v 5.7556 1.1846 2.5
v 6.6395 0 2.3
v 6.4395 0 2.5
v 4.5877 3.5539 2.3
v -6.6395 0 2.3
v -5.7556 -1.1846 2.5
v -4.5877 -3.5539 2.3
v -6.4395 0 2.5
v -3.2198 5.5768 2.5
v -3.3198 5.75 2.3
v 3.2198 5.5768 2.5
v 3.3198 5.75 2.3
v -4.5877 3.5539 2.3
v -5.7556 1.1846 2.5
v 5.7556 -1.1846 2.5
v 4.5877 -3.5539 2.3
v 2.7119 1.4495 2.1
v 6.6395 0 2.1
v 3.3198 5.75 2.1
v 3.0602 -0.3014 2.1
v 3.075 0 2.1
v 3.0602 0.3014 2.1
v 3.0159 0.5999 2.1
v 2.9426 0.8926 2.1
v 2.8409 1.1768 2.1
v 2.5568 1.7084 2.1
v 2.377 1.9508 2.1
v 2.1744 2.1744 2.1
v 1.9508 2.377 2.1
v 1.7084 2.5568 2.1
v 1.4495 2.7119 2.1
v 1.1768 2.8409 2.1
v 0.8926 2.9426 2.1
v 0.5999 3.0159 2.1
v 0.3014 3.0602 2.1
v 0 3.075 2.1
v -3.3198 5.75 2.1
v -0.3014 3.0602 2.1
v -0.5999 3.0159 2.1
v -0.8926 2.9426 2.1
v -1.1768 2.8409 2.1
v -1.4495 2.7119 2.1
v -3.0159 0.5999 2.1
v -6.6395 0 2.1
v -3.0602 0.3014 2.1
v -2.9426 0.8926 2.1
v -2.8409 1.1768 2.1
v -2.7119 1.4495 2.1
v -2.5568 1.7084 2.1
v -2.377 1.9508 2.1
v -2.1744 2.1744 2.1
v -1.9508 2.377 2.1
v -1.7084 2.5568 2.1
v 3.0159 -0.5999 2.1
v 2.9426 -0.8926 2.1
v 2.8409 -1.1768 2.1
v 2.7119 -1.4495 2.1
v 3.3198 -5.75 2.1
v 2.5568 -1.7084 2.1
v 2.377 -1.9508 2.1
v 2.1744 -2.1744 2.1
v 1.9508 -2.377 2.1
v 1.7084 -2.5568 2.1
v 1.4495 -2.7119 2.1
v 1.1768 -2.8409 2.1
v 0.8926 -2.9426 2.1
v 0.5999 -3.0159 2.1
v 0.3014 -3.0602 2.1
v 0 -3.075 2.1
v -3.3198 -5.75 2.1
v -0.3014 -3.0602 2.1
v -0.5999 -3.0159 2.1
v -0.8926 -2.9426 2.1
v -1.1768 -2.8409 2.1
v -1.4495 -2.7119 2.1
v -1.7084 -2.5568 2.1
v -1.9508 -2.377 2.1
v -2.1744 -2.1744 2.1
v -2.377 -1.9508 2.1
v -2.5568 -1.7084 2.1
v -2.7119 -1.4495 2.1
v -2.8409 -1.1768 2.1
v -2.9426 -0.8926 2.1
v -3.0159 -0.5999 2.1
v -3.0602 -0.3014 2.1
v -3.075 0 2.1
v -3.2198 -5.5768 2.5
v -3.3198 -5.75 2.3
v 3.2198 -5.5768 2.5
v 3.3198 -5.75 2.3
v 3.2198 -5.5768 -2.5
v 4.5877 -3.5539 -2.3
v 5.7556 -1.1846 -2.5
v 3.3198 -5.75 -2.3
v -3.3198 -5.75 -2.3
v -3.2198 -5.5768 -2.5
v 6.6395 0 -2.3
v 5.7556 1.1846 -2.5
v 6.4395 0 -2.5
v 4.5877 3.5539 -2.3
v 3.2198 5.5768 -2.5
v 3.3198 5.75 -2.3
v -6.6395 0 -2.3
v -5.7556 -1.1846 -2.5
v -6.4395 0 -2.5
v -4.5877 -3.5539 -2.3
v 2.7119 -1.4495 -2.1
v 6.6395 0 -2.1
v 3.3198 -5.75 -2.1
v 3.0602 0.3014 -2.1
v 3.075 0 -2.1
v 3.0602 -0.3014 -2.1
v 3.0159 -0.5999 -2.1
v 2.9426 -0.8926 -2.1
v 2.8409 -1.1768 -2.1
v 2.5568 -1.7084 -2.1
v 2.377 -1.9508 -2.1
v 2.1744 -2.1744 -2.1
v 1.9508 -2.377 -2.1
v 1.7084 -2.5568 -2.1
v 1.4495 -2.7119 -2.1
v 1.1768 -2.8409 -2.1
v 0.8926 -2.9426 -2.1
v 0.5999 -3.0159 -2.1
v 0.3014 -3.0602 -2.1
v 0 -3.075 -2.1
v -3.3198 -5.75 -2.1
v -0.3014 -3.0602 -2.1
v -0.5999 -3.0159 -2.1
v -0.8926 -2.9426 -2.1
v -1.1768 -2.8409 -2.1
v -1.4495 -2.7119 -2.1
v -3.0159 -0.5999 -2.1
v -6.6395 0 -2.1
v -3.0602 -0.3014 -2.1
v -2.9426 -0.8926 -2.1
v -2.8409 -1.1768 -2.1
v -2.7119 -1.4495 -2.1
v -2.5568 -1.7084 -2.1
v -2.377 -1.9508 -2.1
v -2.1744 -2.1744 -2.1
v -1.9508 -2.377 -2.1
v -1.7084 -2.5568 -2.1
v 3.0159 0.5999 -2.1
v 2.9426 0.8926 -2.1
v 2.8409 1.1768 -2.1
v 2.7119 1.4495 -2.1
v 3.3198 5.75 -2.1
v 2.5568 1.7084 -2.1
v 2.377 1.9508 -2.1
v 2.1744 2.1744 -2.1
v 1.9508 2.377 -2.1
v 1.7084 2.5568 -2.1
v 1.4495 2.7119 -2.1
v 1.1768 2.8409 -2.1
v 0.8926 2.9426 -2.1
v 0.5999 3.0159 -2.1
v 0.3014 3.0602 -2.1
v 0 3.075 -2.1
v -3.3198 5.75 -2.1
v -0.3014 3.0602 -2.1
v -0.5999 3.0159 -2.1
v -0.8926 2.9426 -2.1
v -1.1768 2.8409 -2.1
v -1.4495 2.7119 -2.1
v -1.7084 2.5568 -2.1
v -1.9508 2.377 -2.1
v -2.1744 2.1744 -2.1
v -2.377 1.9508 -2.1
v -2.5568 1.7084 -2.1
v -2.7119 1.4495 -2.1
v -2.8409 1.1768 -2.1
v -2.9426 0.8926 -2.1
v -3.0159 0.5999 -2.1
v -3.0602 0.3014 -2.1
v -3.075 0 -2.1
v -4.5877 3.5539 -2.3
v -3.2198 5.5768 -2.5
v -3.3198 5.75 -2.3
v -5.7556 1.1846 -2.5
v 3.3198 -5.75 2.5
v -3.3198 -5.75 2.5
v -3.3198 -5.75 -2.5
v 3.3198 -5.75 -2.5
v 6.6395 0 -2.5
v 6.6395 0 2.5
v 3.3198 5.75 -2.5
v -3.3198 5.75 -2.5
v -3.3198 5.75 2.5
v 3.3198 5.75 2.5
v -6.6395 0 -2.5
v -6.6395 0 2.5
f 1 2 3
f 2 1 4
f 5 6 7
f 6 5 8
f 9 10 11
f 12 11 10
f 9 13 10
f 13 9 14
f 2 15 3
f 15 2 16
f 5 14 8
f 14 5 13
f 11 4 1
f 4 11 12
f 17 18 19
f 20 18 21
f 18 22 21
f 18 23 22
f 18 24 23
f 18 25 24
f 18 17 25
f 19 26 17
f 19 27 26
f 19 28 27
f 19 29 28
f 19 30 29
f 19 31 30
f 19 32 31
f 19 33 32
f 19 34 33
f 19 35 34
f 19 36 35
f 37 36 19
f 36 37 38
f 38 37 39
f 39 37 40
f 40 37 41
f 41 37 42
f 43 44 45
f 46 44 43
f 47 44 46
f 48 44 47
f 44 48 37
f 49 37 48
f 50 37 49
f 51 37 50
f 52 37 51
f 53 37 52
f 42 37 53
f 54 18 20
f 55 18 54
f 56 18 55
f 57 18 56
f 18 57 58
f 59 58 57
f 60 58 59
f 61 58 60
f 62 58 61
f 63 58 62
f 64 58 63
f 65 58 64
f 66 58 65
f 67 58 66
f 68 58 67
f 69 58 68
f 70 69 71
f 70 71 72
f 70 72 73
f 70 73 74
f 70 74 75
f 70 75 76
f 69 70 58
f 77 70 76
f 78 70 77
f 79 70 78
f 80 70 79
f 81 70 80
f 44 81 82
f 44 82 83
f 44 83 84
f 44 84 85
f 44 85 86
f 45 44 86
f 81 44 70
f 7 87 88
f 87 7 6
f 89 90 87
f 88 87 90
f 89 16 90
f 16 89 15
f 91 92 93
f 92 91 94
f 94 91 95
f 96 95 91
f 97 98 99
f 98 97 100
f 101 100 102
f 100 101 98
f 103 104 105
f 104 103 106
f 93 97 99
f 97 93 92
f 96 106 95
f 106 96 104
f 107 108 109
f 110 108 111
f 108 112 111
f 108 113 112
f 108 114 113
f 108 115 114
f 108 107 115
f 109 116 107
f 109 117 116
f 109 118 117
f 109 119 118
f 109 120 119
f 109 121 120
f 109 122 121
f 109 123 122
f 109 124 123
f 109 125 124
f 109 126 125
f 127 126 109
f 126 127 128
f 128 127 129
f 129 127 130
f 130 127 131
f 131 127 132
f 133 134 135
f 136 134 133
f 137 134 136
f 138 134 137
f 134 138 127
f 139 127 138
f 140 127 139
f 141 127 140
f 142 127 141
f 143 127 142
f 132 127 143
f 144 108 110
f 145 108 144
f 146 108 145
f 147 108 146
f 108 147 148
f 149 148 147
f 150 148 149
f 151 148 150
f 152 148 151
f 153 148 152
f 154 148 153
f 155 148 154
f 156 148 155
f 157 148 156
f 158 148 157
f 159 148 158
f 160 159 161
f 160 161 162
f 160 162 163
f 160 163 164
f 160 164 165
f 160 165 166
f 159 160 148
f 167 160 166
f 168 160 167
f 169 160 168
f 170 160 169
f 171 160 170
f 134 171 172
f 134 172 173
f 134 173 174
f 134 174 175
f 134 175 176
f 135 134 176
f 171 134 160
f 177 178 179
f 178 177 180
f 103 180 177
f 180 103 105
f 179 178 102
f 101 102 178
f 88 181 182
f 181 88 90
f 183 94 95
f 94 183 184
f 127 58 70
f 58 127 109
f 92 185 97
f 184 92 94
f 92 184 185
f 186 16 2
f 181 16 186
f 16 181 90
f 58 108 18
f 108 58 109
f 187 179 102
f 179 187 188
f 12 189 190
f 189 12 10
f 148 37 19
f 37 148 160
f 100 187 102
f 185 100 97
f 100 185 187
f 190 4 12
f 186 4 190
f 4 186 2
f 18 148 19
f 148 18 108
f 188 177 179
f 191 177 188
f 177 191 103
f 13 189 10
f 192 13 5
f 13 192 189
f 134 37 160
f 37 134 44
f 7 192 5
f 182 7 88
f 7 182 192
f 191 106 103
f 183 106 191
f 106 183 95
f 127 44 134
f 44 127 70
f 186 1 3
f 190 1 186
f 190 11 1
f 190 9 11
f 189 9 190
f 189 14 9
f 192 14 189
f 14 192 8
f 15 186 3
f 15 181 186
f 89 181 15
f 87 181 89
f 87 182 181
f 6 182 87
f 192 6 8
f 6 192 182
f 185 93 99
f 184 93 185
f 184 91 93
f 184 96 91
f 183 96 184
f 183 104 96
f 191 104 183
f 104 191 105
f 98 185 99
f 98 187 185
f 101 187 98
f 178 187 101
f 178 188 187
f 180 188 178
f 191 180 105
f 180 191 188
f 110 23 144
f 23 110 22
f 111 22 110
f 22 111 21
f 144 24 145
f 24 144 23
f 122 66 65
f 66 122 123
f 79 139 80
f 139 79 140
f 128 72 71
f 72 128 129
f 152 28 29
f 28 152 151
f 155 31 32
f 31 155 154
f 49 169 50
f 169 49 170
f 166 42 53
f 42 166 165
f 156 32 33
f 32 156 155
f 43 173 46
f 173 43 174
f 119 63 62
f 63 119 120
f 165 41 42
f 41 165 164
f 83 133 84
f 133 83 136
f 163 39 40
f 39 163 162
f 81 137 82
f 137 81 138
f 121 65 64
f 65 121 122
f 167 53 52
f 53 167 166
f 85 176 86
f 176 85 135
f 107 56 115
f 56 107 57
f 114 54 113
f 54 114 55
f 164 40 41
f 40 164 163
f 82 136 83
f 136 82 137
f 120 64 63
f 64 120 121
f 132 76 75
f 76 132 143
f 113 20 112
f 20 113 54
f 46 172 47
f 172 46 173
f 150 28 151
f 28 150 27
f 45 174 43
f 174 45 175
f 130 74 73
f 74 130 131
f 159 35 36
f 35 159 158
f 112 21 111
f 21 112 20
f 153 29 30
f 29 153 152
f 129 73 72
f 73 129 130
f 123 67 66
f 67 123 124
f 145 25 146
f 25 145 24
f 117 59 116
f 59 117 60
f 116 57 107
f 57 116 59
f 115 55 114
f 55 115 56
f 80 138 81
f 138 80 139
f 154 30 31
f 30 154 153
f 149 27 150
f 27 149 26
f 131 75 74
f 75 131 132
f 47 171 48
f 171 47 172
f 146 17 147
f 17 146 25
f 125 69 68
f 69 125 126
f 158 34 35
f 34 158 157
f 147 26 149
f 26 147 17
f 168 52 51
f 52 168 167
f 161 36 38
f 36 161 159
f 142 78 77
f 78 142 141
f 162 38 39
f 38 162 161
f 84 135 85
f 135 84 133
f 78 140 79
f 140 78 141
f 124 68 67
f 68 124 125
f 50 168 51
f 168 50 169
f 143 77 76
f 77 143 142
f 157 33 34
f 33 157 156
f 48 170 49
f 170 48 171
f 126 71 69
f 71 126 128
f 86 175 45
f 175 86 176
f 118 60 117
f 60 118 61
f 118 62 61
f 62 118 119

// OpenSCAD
// Plain hex nut: M6 (6.0mm screw), 11.5mm across flats, 5.0mm thick

thread_nominal_diameter_mm = 6.0;   // screw nominal diameter
across_flats_mm            = 11.5;  // AF
thickness_mm               = 5.0;   // nut thickness

// Hole sizing (simple cylindrical hole; not modeled threads)
tolerance_mm               = 0.15;  // added to hole diameter
clearance_extra_mm         = 0.0;   // set >0 for clearance fit
tap_drill_offset_mm        = 1.0;   // used only if hole_type_threaded_flag=1
hole_type_threaded_flag    = 0;     // 0=clearance hole, 1=tap-drill hole

// Edge treatment
chamfer_mm                 = 0.3;   // small chamfer on both faces
eps_mm                     = 0.2;

module hex_nut() {
    hex_R = across_flats_mm / (2 * cos(30)); // circumradius from across-flats
    hole_d = (hole_type_threaded_flag == 1)
        ? (thread_nominal_diameter_mm - tap_drill_offset_mm + tolerance_mm)
        : (thread_nominal_diameter_mm + clearance_extra_mm + tolerance_mm);

    difference() {
        // Outer hex body
        cylinder(r=hex_R, h=thickness_mm, center=true, $fn=6);

        // Through hole
        cylinder(d=hole_d, h=thickness_mm + 2*eps_mm, center=true, $fn=64);

        // Chamfers (remove material at both faces)
        if (chamfer_mm > 0) {
            // Top chamfer
            translate([0, 0, thickness_mm/2 - chamfer_mm/2])
                cylinder(h=chamfer_mm + eps_mm,
                         r1=hex_R + eps_mm,
                         r2=hex_R - chamfer_mm,
                         center=true, $fn=6);

            // Bottom chamfer
            translate([0, 0, -thickness_mm/2 + chamfer_mm/2])
                cylinder(h=chamfer_mm + eps_mm,
                         r1=hex_R - chamfer_mm,
                         r2=hex_R + eps_mm,
                         center=true, $fn=6);
        }
    }
}

hex_nut();
